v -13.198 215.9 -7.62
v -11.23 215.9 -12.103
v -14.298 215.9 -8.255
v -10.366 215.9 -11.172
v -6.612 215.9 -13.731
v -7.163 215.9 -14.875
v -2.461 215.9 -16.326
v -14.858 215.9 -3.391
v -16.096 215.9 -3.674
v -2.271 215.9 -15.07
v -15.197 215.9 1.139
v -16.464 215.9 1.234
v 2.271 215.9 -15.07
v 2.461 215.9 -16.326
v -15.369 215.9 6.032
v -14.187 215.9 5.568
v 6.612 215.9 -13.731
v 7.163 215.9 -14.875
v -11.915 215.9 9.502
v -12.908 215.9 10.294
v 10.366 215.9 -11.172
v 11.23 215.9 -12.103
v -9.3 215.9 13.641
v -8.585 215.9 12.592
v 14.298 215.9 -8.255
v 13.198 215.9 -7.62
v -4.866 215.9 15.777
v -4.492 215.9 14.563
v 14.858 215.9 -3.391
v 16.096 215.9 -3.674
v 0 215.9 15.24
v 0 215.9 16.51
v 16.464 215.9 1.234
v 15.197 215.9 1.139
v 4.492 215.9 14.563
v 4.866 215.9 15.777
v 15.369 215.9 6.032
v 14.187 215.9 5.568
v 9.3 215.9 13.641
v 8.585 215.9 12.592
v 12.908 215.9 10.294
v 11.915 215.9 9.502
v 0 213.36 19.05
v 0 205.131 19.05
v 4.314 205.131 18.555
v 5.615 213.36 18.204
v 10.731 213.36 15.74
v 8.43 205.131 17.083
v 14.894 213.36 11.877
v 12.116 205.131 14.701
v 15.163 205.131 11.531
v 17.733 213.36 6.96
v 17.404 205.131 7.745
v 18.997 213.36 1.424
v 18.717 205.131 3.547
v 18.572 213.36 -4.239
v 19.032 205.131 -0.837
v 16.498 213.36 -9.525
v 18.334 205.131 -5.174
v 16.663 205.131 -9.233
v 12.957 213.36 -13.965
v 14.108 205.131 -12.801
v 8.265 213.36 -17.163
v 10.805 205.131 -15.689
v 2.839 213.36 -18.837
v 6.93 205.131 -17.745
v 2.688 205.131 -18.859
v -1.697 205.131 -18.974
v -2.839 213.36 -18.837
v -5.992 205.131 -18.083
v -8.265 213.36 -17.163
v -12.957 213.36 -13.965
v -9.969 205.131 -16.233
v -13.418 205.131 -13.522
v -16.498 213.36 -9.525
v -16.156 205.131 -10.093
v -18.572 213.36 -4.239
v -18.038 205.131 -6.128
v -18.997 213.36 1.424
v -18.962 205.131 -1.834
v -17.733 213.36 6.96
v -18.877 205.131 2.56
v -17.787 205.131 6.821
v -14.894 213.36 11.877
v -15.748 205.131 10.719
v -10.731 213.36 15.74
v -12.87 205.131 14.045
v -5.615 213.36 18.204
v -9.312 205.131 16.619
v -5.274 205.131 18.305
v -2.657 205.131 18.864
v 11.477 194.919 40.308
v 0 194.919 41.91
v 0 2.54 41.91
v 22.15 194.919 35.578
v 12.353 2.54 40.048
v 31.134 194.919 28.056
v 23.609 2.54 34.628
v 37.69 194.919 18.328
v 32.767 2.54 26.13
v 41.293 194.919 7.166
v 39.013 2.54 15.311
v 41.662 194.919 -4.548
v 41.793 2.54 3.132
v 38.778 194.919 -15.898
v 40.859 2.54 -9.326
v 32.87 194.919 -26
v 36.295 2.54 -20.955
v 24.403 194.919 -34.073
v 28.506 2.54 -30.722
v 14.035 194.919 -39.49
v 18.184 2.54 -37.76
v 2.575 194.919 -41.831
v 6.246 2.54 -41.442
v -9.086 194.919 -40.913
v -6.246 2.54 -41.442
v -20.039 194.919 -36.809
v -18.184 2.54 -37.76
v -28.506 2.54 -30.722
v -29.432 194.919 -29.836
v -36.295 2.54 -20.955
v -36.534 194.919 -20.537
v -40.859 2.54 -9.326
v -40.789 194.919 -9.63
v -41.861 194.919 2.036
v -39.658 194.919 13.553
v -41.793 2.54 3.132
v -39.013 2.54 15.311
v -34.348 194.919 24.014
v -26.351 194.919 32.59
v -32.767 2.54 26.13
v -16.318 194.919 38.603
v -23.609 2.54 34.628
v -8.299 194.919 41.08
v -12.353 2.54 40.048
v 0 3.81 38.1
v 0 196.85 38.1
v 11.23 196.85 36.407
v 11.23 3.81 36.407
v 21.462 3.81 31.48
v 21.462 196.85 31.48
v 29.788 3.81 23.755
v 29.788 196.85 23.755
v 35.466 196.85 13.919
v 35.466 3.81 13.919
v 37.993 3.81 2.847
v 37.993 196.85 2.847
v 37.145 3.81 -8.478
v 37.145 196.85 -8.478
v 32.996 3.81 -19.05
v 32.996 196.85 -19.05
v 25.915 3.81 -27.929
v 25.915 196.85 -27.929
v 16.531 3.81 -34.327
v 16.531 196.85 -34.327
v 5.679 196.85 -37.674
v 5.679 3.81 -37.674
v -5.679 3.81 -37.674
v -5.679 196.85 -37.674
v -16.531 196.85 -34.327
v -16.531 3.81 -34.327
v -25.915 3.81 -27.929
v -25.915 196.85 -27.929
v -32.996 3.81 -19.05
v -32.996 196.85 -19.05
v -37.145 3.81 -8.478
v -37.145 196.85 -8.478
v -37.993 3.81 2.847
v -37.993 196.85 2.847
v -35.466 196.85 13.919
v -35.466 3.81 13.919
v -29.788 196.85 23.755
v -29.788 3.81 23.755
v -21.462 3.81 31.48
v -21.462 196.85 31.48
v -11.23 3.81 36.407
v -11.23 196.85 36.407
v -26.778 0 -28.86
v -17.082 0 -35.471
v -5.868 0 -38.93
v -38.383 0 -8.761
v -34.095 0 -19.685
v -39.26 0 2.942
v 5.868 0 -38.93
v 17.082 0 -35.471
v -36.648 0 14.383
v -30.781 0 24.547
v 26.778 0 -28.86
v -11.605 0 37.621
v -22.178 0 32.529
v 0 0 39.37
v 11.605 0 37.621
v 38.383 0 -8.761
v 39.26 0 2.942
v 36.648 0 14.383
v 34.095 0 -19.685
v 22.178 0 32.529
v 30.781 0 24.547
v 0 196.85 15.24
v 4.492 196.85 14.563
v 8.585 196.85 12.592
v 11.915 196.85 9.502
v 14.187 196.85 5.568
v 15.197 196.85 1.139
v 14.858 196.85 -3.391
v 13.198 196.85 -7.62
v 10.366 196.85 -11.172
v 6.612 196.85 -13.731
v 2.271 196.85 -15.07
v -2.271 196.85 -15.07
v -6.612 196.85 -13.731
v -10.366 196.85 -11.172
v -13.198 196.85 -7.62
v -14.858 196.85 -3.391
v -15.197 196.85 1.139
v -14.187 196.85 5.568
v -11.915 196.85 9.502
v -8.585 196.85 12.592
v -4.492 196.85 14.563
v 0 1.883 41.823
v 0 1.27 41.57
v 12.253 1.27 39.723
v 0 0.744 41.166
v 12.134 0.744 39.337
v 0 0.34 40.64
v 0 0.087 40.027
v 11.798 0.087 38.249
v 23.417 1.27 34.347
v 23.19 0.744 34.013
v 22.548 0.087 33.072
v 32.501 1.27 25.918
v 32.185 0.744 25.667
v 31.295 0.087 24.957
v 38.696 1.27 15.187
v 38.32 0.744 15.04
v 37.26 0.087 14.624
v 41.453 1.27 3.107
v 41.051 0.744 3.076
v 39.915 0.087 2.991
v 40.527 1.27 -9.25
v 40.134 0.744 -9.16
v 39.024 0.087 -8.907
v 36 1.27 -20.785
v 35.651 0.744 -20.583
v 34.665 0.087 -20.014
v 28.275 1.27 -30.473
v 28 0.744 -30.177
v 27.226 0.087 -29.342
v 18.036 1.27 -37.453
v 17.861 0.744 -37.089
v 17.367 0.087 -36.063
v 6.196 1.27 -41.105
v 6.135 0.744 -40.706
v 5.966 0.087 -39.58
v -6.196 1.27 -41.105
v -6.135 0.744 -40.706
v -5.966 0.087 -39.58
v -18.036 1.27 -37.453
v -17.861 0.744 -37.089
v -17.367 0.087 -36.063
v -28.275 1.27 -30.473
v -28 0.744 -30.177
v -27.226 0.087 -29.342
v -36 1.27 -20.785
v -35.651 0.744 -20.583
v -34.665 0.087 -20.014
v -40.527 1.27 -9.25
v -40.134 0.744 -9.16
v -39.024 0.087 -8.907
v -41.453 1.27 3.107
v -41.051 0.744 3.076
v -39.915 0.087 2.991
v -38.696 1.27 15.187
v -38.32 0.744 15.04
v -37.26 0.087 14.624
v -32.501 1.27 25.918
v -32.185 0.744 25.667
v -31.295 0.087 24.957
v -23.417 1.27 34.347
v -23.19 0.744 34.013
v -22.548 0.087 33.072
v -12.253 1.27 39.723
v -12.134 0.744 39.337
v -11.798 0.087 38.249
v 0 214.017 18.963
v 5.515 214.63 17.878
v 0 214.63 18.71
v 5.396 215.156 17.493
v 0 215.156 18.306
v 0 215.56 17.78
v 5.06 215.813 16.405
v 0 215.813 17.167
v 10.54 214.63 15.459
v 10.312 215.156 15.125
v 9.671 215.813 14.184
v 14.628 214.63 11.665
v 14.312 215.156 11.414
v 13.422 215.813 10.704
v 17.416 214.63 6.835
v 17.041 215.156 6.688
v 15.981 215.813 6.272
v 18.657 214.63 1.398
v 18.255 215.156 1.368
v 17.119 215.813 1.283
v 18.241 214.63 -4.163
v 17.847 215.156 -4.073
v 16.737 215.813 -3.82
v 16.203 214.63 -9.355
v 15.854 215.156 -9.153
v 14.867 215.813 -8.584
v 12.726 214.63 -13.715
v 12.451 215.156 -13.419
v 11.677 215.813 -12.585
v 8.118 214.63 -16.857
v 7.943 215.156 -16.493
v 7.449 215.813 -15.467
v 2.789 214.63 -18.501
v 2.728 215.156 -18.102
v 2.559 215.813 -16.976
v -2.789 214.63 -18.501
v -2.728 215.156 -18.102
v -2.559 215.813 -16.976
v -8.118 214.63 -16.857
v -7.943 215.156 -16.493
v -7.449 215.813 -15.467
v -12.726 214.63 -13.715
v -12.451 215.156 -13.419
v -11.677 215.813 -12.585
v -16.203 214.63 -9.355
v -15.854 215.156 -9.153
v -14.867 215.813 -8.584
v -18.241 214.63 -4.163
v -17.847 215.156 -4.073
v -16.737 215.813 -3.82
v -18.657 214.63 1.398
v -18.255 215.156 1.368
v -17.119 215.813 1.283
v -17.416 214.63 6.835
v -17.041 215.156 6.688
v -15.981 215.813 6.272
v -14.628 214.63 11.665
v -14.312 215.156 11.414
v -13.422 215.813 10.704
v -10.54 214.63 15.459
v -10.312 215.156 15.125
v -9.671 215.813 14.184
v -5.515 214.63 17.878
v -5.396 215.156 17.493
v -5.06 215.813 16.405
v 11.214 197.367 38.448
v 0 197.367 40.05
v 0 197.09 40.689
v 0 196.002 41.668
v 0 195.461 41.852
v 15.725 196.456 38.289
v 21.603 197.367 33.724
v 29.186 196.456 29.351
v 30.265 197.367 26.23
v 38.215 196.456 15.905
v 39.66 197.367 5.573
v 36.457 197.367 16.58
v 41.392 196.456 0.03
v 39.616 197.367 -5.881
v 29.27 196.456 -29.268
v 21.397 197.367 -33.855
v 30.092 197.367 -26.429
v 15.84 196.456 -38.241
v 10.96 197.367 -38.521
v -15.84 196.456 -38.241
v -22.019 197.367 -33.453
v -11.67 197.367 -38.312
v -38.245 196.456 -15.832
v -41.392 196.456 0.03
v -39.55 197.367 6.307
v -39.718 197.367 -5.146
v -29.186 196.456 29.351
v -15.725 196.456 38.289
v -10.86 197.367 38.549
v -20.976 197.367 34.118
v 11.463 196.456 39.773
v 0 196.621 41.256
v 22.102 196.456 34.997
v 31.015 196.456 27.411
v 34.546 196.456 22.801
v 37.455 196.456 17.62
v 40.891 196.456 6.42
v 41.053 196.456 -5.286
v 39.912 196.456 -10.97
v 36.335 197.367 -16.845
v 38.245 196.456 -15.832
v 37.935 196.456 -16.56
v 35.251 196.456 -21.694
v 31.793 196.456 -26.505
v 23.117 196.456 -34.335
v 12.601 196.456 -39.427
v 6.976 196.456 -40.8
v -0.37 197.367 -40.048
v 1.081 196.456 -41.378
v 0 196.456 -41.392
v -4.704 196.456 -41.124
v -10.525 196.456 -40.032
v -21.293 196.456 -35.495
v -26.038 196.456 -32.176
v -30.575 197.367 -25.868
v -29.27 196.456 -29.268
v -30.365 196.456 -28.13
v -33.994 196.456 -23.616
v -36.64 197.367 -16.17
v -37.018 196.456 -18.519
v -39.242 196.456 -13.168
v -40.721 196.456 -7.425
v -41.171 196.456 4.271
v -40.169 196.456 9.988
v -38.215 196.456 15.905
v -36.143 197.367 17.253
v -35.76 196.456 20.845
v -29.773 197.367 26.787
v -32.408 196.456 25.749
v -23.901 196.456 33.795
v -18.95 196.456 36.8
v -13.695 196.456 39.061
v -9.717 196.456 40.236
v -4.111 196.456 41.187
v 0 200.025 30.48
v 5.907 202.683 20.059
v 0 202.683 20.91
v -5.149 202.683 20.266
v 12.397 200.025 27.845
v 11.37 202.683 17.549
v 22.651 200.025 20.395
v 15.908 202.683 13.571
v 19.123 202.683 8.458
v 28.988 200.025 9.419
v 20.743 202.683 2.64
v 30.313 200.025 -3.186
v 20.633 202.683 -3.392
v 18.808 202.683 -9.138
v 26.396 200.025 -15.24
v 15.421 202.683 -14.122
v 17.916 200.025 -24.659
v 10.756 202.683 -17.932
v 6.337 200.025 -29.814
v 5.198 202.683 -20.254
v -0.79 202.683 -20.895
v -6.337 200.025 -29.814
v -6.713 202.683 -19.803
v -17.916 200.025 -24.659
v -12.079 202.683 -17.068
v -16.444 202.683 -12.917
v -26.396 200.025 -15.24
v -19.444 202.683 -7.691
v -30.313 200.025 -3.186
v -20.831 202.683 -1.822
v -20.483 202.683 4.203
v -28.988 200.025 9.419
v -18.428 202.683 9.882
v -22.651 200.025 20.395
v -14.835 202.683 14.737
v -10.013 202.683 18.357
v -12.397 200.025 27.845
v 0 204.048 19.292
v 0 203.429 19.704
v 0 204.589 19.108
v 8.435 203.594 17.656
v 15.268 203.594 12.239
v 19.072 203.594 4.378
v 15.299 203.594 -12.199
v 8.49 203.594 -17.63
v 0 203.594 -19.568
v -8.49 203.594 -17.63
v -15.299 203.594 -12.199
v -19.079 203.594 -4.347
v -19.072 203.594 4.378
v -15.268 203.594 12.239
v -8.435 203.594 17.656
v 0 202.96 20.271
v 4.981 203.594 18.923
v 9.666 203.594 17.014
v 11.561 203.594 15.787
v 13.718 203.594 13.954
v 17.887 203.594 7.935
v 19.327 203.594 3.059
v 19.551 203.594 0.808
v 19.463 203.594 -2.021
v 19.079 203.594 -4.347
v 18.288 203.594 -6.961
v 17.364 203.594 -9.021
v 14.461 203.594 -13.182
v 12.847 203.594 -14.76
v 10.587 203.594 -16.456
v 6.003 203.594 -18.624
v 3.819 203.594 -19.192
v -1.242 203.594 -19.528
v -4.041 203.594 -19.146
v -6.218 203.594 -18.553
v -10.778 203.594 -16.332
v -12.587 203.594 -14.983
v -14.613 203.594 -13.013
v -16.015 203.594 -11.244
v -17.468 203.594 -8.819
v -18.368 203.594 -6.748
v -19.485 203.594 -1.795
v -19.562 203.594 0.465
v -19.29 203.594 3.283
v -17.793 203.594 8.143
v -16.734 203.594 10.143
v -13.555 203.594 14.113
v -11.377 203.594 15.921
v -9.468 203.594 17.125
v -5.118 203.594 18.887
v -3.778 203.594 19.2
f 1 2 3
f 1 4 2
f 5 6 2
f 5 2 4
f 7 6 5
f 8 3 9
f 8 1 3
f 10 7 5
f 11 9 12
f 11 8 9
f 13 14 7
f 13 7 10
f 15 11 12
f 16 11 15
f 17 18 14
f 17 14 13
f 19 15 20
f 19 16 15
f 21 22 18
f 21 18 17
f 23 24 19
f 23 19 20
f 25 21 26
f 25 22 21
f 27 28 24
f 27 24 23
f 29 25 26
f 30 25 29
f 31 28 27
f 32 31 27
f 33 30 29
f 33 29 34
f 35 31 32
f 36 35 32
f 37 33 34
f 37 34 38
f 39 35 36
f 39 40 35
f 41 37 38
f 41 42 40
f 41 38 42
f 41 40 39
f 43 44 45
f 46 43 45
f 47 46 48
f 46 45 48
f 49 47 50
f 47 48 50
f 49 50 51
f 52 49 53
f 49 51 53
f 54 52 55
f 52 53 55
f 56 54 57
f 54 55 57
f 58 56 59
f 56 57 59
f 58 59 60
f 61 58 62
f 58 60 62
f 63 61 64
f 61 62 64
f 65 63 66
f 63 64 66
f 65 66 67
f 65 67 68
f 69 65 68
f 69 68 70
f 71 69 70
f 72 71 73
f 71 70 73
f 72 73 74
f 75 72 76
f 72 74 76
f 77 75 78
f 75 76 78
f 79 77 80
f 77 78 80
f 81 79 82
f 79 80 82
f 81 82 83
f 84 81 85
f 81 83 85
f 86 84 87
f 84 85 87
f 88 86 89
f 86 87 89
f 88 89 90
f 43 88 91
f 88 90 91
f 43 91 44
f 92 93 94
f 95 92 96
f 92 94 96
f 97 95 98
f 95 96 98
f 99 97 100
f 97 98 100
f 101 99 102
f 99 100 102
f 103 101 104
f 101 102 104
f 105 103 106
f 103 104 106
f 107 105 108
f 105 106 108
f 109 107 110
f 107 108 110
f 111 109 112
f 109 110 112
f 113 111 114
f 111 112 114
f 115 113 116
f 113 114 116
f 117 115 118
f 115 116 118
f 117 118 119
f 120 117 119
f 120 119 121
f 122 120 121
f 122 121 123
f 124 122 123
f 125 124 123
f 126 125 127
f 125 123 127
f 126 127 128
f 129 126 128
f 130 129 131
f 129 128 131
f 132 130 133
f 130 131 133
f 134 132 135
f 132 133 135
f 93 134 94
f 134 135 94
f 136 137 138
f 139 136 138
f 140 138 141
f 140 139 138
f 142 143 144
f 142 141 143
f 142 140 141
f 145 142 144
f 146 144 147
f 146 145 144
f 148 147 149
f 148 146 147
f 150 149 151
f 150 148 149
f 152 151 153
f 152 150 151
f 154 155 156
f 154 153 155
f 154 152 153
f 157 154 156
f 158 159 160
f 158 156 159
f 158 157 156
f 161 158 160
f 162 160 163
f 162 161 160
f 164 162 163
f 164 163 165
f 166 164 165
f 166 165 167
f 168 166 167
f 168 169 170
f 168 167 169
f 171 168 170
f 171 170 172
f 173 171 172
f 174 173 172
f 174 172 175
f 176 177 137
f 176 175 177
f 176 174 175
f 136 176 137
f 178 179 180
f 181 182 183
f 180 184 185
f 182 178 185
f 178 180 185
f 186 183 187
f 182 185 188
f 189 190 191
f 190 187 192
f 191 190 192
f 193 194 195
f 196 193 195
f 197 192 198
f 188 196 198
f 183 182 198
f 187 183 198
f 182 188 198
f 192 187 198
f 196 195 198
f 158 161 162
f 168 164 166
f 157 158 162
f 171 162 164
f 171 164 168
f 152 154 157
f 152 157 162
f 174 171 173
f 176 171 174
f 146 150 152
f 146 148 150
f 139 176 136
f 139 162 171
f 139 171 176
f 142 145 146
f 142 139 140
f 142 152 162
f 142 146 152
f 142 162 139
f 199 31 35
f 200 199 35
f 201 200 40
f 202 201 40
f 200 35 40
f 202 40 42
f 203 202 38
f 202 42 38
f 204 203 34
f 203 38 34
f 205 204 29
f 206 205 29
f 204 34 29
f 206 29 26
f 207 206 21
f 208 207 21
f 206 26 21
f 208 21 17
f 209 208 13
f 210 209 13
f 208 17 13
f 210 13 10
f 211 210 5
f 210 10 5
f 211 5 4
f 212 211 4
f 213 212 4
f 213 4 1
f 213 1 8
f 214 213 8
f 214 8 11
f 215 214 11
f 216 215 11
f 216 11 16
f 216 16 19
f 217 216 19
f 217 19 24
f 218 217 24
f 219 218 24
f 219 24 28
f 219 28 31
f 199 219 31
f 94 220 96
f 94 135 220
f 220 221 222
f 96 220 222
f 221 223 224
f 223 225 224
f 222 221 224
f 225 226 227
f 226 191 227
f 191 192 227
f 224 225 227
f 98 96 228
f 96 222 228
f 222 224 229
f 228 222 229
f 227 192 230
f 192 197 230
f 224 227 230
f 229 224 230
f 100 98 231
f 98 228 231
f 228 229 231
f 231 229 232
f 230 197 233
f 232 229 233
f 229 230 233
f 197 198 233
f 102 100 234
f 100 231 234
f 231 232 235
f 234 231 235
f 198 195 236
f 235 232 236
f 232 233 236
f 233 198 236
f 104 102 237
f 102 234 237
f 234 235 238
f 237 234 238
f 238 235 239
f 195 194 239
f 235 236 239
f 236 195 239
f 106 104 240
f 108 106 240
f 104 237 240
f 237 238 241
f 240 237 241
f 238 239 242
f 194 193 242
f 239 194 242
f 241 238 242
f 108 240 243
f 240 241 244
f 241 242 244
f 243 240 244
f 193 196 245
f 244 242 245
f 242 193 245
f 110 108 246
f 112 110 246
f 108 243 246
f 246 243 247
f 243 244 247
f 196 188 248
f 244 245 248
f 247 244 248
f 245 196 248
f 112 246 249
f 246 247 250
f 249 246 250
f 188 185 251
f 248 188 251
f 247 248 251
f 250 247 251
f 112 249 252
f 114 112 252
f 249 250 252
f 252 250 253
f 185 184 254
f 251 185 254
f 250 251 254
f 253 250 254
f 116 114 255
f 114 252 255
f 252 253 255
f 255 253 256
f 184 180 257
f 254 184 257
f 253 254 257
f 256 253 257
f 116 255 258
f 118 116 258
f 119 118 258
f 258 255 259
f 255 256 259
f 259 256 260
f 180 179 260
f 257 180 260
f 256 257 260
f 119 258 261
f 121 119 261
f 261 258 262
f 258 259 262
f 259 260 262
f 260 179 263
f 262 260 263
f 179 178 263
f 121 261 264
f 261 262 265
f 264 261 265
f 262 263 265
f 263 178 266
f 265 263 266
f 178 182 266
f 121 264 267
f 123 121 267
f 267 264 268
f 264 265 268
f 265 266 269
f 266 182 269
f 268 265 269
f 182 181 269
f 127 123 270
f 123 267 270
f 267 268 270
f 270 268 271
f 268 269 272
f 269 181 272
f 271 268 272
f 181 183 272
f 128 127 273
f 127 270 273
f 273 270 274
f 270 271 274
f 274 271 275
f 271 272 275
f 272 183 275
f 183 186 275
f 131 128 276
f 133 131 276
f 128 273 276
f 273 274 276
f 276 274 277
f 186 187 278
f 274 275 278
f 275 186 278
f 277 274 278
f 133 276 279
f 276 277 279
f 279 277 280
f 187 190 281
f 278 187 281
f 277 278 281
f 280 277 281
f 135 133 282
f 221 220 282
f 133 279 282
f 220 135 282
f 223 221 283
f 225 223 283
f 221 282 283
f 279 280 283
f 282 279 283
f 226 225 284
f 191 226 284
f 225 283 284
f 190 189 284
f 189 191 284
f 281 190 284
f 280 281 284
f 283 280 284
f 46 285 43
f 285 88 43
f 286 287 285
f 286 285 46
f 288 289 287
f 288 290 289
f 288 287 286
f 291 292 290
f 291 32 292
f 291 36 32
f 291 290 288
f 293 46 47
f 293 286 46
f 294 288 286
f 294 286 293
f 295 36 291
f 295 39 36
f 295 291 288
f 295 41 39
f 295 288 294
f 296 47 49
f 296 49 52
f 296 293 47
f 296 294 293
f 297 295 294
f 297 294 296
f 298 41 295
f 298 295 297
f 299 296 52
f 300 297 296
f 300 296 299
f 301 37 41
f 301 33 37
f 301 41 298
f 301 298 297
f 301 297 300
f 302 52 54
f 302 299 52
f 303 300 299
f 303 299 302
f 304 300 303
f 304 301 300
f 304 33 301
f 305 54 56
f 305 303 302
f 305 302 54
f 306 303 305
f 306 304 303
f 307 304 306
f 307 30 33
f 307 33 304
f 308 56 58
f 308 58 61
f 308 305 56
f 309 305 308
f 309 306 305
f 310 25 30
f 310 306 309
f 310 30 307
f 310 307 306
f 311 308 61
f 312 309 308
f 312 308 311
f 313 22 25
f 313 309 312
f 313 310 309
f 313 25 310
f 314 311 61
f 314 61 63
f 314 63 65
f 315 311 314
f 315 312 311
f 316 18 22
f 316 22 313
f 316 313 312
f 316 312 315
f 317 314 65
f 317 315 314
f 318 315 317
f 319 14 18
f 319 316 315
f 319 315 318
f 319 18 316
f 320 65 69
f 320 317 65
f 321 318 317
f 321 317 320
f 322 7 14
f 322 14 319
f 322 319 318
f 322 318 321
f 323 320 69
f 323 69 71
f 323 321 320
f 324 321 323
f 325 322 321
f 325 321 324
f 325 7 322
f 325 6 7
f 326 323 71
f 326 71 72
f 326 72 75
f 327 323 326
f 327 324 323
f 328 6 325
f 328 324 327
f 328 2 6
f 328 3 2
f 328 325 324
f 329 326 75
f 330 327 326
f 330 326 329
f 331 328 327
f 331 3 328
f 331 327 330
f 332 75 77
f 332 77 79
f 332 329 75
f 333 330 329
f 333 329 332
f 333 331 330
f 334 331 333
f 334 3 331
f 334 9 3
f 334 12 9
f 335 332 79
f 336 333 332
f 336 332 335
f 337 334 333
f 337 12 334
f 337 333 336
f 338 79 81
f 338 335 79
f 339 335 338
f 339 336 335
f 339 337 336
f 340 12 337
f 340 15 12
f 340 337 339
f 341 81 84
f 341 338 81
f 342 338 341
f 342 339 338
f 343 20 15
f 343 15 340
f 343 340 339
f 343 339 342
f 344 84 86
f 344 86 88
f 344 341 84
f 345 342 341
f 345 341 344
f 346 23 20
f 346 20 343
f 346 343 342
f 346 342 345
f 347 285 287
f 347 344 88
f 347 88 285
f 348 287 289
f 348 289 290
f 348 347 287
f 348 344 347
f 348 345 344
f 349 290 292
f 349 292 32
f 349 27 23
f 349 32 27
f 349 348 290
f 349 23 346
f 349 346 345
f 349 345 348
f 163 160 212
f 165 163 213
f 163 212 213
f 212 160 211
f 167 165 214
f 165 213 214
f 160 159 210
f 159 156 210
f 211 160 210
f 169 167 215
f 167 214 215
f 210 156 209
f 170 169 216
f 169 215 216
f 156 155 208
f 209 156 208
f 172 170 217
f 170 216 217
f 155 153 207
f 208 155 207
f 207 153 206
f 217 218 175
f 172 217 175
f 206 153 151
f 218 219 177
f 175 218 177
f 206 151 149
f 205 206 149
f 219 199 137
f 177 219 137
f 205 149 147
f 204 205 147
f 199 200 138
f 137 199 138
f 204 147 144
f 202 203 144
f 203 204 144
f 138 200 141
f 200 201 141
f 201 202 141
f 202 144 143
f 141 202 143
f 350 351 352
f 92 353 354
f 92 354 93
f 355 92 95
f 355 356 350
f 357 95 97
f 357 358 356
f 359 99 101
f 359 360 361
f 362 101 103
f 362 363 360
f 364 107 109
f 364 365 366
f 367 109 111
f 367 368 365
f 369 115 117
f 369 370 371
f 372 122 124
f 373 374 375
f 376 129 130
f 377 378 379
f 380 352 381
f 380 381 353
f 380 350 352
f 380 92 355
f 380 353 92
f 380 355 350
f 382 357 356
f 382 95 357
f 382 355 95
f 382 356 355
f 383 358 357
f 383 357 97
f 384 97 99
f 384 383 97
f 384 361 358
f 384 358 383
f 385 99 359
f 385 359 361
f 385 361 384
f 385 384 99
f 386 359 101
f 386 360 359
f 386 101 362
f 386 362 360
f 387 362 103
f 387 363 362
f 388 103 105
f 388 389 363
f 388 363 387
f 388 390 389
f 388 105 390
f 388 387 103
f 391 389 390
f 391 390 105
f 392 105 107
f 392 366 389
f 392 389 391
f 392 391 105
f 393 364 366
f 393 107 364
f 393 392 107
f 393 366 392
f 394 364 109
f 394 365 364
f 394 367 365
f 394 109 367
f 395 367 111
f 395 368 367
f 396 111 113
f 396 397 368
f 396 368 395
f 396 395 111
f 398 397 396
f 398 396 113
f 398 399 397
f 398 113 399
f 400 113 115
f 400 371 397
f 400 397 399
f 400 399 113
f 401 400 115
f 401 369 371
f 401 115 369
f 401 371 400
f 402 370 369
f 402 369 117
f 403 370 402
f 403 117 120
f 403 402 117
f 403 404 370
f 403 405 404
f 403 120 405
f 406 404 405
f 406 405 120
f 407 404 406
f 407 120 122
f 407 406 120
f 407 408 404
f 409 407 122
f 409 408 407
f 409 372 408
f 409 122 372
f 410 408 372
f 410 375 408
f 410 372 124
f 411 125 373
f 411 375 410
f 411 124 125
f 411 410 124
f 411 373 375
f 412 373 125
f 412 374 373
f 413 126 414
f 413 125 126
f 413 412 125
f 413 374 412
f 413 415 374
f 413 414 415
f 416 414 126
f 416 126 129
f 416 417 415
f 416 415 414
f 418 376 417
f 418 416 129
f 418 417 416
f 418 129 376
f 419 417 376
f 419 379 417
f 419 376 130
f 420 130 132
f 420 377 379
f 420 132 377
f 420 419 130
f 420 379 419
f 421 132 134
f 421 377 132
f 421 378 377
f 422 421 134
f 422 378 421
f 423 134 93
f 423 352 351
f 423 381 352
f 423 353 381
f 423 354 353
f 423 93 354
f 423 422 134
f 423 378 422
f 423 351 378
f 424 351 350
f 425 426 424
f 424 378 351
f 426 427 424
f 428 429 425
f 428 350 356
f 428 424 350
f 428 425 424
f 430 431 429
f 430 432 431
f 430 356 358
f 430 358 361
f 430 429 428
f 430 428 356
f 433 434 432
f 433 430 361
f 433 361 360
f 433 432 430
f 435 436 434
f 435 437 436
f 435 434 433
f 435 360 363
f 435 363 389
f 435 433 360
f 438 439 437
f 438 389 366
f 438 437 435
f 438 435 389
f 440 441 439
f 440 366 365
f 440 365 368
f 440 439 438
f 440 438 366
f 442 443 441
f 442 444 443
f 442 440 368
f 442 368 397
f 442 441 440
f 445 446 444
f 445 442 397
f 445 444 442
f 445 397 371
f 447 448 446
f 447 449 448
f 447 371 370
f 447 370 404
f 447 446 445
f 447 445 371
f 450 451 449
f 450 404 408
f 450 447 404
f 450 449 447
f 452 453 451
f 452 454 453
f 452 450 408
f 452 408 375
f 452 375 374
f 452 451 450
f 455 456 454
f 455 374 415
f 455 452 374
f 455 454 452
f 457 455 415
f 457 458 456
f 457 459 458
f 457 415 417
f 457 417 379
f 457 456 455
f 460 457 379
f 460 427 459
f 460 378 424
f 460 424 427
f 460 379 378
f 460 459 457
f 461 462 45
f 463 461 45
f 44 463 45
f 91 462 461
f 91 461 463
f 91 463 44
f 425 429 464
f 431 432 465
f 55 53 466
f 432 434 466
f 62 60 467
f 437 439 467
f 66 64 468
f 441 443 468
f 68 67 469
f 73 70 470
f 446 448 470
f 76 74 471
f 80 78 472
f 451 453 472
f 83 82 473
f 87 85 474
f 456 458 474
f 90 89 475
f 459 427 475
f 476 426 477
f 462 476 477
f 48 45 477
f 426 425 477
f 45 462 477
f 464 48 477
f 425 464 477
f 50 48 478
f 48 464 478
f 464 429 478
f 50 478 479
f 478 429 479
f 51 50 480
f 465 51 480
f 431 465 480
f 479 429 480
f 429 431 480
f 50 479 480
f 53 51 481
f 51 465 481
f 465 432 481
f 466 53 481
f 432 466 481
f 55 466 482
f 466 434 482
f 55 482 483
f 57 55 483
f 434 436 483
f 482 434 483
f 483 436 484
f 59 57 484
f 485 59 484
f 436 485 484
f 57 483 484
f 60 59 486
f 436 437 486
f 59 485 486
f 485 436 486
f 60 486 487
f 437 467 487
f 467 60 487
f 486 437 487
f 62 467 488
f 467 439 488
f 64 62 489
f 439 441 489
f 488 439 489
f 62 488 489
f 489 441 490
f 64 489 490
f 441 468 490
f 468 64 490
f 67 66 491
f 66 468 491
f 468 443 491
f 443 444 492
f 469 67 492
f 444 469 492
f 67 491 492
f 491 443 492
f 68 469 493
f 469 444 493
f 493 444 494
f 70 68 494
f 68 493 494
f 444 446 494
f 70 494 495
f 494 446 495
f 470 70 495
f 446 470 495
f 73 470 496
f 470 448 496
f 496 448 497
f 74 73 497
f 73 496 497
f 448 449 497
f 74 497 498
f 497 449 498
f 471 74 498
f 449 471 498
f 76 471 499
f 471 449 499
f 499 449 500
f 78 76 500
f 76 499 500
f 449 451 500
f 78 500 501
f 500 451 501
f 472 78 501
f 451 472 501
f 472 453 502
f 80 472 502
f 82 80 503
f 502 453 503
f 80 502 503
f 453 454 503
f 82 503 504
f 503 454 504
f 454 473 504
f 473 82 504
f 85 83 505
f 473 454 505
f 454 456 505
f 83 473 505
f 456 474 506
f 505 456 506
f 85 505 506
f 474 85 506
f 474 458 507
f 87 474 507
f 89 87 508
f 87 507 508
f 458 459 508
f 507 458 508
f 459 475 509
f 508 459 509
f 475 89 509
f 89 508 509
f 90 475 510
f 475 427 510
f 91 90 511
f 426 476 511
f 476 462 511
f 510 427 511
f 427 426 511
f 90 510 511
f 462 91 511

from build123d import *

# Parameters (mm, degrees)
SKETCH1_R           = 41.91
BOSS_EXTRUDE1_DEPTH = 196.85
SKETCH6_R           = 19.05
BOSS_EXTRUDE4_DEPTH = 12.7
SHELL7_T            = -3.81
CUT_EXTRUDE2_REACH  = 225.888
SKETCH13_R          = 15.24
FILLET12_R          = 2.54


with BuildPart() as part:
    # Sketch1 → Boss-Extrude1 (new body)
    with BuildSketch(Plane(origin=(0, 0, 0), x_dir=(1, 0, 0), z_dir=(0, 1, 0))):
        with Locations(Location((0, 0, 0), (0, 0, 270))):
            Circle(SKETCH1_R)
    extrude(amount=BOSS_EXTRUDE1_DEPTH)

    # Shell7
    shell7_openings = [part.faces().sort_by_distance(p)[0] for p in [
        (0, 196.85, 0),
    ]]
    offset(amount=SHELL7_T, openings=shell7_openings, kind=Kind.INTERSECTION)



with BuildPart() as body_2:
    # Sketch6 → Boss-Extrude4 (new body)
    with BuildSketch(Plane(origin=(0, 203.2, 0), x_dir=(1, 0, 0), z_dir=(0, 1, 0))):
        with Locations(Location((0, 0, 0), (0, 0, 270))):
            Circle(SKETCH6_R)
    extrude(amount=BOSS_EXTRUDE4_DEPTH)


with BuildPart() as part_1:
    add(part.part)

    add(body_2.part)  # loft3 joins it to this body
    # loft up to a face of the part (loft3)
    loft([Face(Wire([part_1.edges().sort_by_distance((30.551075175, 196.85, -28.689369209))[0]])), Face(Wire([part_1.edges().sort_by_distance((-13.886852352, 203.2, -13.040622368))[0]]))])

    # Sketch13 → Cut-Extrude2 (cut, up to next)
    with BuildSketch(Plane(origin=(0, 215.9, 0), x_dir=(1, 0, 0), z_dir=(0, 1, 0)), mode=Mode.PRIVATE) as cut_extrude2_sk1:
        with Locations(Location((0, 0, 0), (0, 0, 270))):
            Circle(SKETCH13_R)
    cut_extrude2_tool1 = extrude(cut_extrude2_sk1.sketch, amount=-CUT_EXTRUDE2_REACH, mode=Mode.PRIVATE) & part_1.part
    add(cut_extrude2_tool1.solids().sort_by_distance((0, 215.9, 0))[0], mode=Mode.SUBTRACT)

    # Fillet12
    fillet12_edges = [part_1.edges().sort_by_distance(p)[0] for p in [
        (0, 215.9, -19.05),
        (0, 0, -41.91),
        (0, 196.85, -41.91),
        (0, 203.2, -19.05),
    ]]
    fillet(fillet12_edges, radius=FILLET12_R)


solid = part_1.part
